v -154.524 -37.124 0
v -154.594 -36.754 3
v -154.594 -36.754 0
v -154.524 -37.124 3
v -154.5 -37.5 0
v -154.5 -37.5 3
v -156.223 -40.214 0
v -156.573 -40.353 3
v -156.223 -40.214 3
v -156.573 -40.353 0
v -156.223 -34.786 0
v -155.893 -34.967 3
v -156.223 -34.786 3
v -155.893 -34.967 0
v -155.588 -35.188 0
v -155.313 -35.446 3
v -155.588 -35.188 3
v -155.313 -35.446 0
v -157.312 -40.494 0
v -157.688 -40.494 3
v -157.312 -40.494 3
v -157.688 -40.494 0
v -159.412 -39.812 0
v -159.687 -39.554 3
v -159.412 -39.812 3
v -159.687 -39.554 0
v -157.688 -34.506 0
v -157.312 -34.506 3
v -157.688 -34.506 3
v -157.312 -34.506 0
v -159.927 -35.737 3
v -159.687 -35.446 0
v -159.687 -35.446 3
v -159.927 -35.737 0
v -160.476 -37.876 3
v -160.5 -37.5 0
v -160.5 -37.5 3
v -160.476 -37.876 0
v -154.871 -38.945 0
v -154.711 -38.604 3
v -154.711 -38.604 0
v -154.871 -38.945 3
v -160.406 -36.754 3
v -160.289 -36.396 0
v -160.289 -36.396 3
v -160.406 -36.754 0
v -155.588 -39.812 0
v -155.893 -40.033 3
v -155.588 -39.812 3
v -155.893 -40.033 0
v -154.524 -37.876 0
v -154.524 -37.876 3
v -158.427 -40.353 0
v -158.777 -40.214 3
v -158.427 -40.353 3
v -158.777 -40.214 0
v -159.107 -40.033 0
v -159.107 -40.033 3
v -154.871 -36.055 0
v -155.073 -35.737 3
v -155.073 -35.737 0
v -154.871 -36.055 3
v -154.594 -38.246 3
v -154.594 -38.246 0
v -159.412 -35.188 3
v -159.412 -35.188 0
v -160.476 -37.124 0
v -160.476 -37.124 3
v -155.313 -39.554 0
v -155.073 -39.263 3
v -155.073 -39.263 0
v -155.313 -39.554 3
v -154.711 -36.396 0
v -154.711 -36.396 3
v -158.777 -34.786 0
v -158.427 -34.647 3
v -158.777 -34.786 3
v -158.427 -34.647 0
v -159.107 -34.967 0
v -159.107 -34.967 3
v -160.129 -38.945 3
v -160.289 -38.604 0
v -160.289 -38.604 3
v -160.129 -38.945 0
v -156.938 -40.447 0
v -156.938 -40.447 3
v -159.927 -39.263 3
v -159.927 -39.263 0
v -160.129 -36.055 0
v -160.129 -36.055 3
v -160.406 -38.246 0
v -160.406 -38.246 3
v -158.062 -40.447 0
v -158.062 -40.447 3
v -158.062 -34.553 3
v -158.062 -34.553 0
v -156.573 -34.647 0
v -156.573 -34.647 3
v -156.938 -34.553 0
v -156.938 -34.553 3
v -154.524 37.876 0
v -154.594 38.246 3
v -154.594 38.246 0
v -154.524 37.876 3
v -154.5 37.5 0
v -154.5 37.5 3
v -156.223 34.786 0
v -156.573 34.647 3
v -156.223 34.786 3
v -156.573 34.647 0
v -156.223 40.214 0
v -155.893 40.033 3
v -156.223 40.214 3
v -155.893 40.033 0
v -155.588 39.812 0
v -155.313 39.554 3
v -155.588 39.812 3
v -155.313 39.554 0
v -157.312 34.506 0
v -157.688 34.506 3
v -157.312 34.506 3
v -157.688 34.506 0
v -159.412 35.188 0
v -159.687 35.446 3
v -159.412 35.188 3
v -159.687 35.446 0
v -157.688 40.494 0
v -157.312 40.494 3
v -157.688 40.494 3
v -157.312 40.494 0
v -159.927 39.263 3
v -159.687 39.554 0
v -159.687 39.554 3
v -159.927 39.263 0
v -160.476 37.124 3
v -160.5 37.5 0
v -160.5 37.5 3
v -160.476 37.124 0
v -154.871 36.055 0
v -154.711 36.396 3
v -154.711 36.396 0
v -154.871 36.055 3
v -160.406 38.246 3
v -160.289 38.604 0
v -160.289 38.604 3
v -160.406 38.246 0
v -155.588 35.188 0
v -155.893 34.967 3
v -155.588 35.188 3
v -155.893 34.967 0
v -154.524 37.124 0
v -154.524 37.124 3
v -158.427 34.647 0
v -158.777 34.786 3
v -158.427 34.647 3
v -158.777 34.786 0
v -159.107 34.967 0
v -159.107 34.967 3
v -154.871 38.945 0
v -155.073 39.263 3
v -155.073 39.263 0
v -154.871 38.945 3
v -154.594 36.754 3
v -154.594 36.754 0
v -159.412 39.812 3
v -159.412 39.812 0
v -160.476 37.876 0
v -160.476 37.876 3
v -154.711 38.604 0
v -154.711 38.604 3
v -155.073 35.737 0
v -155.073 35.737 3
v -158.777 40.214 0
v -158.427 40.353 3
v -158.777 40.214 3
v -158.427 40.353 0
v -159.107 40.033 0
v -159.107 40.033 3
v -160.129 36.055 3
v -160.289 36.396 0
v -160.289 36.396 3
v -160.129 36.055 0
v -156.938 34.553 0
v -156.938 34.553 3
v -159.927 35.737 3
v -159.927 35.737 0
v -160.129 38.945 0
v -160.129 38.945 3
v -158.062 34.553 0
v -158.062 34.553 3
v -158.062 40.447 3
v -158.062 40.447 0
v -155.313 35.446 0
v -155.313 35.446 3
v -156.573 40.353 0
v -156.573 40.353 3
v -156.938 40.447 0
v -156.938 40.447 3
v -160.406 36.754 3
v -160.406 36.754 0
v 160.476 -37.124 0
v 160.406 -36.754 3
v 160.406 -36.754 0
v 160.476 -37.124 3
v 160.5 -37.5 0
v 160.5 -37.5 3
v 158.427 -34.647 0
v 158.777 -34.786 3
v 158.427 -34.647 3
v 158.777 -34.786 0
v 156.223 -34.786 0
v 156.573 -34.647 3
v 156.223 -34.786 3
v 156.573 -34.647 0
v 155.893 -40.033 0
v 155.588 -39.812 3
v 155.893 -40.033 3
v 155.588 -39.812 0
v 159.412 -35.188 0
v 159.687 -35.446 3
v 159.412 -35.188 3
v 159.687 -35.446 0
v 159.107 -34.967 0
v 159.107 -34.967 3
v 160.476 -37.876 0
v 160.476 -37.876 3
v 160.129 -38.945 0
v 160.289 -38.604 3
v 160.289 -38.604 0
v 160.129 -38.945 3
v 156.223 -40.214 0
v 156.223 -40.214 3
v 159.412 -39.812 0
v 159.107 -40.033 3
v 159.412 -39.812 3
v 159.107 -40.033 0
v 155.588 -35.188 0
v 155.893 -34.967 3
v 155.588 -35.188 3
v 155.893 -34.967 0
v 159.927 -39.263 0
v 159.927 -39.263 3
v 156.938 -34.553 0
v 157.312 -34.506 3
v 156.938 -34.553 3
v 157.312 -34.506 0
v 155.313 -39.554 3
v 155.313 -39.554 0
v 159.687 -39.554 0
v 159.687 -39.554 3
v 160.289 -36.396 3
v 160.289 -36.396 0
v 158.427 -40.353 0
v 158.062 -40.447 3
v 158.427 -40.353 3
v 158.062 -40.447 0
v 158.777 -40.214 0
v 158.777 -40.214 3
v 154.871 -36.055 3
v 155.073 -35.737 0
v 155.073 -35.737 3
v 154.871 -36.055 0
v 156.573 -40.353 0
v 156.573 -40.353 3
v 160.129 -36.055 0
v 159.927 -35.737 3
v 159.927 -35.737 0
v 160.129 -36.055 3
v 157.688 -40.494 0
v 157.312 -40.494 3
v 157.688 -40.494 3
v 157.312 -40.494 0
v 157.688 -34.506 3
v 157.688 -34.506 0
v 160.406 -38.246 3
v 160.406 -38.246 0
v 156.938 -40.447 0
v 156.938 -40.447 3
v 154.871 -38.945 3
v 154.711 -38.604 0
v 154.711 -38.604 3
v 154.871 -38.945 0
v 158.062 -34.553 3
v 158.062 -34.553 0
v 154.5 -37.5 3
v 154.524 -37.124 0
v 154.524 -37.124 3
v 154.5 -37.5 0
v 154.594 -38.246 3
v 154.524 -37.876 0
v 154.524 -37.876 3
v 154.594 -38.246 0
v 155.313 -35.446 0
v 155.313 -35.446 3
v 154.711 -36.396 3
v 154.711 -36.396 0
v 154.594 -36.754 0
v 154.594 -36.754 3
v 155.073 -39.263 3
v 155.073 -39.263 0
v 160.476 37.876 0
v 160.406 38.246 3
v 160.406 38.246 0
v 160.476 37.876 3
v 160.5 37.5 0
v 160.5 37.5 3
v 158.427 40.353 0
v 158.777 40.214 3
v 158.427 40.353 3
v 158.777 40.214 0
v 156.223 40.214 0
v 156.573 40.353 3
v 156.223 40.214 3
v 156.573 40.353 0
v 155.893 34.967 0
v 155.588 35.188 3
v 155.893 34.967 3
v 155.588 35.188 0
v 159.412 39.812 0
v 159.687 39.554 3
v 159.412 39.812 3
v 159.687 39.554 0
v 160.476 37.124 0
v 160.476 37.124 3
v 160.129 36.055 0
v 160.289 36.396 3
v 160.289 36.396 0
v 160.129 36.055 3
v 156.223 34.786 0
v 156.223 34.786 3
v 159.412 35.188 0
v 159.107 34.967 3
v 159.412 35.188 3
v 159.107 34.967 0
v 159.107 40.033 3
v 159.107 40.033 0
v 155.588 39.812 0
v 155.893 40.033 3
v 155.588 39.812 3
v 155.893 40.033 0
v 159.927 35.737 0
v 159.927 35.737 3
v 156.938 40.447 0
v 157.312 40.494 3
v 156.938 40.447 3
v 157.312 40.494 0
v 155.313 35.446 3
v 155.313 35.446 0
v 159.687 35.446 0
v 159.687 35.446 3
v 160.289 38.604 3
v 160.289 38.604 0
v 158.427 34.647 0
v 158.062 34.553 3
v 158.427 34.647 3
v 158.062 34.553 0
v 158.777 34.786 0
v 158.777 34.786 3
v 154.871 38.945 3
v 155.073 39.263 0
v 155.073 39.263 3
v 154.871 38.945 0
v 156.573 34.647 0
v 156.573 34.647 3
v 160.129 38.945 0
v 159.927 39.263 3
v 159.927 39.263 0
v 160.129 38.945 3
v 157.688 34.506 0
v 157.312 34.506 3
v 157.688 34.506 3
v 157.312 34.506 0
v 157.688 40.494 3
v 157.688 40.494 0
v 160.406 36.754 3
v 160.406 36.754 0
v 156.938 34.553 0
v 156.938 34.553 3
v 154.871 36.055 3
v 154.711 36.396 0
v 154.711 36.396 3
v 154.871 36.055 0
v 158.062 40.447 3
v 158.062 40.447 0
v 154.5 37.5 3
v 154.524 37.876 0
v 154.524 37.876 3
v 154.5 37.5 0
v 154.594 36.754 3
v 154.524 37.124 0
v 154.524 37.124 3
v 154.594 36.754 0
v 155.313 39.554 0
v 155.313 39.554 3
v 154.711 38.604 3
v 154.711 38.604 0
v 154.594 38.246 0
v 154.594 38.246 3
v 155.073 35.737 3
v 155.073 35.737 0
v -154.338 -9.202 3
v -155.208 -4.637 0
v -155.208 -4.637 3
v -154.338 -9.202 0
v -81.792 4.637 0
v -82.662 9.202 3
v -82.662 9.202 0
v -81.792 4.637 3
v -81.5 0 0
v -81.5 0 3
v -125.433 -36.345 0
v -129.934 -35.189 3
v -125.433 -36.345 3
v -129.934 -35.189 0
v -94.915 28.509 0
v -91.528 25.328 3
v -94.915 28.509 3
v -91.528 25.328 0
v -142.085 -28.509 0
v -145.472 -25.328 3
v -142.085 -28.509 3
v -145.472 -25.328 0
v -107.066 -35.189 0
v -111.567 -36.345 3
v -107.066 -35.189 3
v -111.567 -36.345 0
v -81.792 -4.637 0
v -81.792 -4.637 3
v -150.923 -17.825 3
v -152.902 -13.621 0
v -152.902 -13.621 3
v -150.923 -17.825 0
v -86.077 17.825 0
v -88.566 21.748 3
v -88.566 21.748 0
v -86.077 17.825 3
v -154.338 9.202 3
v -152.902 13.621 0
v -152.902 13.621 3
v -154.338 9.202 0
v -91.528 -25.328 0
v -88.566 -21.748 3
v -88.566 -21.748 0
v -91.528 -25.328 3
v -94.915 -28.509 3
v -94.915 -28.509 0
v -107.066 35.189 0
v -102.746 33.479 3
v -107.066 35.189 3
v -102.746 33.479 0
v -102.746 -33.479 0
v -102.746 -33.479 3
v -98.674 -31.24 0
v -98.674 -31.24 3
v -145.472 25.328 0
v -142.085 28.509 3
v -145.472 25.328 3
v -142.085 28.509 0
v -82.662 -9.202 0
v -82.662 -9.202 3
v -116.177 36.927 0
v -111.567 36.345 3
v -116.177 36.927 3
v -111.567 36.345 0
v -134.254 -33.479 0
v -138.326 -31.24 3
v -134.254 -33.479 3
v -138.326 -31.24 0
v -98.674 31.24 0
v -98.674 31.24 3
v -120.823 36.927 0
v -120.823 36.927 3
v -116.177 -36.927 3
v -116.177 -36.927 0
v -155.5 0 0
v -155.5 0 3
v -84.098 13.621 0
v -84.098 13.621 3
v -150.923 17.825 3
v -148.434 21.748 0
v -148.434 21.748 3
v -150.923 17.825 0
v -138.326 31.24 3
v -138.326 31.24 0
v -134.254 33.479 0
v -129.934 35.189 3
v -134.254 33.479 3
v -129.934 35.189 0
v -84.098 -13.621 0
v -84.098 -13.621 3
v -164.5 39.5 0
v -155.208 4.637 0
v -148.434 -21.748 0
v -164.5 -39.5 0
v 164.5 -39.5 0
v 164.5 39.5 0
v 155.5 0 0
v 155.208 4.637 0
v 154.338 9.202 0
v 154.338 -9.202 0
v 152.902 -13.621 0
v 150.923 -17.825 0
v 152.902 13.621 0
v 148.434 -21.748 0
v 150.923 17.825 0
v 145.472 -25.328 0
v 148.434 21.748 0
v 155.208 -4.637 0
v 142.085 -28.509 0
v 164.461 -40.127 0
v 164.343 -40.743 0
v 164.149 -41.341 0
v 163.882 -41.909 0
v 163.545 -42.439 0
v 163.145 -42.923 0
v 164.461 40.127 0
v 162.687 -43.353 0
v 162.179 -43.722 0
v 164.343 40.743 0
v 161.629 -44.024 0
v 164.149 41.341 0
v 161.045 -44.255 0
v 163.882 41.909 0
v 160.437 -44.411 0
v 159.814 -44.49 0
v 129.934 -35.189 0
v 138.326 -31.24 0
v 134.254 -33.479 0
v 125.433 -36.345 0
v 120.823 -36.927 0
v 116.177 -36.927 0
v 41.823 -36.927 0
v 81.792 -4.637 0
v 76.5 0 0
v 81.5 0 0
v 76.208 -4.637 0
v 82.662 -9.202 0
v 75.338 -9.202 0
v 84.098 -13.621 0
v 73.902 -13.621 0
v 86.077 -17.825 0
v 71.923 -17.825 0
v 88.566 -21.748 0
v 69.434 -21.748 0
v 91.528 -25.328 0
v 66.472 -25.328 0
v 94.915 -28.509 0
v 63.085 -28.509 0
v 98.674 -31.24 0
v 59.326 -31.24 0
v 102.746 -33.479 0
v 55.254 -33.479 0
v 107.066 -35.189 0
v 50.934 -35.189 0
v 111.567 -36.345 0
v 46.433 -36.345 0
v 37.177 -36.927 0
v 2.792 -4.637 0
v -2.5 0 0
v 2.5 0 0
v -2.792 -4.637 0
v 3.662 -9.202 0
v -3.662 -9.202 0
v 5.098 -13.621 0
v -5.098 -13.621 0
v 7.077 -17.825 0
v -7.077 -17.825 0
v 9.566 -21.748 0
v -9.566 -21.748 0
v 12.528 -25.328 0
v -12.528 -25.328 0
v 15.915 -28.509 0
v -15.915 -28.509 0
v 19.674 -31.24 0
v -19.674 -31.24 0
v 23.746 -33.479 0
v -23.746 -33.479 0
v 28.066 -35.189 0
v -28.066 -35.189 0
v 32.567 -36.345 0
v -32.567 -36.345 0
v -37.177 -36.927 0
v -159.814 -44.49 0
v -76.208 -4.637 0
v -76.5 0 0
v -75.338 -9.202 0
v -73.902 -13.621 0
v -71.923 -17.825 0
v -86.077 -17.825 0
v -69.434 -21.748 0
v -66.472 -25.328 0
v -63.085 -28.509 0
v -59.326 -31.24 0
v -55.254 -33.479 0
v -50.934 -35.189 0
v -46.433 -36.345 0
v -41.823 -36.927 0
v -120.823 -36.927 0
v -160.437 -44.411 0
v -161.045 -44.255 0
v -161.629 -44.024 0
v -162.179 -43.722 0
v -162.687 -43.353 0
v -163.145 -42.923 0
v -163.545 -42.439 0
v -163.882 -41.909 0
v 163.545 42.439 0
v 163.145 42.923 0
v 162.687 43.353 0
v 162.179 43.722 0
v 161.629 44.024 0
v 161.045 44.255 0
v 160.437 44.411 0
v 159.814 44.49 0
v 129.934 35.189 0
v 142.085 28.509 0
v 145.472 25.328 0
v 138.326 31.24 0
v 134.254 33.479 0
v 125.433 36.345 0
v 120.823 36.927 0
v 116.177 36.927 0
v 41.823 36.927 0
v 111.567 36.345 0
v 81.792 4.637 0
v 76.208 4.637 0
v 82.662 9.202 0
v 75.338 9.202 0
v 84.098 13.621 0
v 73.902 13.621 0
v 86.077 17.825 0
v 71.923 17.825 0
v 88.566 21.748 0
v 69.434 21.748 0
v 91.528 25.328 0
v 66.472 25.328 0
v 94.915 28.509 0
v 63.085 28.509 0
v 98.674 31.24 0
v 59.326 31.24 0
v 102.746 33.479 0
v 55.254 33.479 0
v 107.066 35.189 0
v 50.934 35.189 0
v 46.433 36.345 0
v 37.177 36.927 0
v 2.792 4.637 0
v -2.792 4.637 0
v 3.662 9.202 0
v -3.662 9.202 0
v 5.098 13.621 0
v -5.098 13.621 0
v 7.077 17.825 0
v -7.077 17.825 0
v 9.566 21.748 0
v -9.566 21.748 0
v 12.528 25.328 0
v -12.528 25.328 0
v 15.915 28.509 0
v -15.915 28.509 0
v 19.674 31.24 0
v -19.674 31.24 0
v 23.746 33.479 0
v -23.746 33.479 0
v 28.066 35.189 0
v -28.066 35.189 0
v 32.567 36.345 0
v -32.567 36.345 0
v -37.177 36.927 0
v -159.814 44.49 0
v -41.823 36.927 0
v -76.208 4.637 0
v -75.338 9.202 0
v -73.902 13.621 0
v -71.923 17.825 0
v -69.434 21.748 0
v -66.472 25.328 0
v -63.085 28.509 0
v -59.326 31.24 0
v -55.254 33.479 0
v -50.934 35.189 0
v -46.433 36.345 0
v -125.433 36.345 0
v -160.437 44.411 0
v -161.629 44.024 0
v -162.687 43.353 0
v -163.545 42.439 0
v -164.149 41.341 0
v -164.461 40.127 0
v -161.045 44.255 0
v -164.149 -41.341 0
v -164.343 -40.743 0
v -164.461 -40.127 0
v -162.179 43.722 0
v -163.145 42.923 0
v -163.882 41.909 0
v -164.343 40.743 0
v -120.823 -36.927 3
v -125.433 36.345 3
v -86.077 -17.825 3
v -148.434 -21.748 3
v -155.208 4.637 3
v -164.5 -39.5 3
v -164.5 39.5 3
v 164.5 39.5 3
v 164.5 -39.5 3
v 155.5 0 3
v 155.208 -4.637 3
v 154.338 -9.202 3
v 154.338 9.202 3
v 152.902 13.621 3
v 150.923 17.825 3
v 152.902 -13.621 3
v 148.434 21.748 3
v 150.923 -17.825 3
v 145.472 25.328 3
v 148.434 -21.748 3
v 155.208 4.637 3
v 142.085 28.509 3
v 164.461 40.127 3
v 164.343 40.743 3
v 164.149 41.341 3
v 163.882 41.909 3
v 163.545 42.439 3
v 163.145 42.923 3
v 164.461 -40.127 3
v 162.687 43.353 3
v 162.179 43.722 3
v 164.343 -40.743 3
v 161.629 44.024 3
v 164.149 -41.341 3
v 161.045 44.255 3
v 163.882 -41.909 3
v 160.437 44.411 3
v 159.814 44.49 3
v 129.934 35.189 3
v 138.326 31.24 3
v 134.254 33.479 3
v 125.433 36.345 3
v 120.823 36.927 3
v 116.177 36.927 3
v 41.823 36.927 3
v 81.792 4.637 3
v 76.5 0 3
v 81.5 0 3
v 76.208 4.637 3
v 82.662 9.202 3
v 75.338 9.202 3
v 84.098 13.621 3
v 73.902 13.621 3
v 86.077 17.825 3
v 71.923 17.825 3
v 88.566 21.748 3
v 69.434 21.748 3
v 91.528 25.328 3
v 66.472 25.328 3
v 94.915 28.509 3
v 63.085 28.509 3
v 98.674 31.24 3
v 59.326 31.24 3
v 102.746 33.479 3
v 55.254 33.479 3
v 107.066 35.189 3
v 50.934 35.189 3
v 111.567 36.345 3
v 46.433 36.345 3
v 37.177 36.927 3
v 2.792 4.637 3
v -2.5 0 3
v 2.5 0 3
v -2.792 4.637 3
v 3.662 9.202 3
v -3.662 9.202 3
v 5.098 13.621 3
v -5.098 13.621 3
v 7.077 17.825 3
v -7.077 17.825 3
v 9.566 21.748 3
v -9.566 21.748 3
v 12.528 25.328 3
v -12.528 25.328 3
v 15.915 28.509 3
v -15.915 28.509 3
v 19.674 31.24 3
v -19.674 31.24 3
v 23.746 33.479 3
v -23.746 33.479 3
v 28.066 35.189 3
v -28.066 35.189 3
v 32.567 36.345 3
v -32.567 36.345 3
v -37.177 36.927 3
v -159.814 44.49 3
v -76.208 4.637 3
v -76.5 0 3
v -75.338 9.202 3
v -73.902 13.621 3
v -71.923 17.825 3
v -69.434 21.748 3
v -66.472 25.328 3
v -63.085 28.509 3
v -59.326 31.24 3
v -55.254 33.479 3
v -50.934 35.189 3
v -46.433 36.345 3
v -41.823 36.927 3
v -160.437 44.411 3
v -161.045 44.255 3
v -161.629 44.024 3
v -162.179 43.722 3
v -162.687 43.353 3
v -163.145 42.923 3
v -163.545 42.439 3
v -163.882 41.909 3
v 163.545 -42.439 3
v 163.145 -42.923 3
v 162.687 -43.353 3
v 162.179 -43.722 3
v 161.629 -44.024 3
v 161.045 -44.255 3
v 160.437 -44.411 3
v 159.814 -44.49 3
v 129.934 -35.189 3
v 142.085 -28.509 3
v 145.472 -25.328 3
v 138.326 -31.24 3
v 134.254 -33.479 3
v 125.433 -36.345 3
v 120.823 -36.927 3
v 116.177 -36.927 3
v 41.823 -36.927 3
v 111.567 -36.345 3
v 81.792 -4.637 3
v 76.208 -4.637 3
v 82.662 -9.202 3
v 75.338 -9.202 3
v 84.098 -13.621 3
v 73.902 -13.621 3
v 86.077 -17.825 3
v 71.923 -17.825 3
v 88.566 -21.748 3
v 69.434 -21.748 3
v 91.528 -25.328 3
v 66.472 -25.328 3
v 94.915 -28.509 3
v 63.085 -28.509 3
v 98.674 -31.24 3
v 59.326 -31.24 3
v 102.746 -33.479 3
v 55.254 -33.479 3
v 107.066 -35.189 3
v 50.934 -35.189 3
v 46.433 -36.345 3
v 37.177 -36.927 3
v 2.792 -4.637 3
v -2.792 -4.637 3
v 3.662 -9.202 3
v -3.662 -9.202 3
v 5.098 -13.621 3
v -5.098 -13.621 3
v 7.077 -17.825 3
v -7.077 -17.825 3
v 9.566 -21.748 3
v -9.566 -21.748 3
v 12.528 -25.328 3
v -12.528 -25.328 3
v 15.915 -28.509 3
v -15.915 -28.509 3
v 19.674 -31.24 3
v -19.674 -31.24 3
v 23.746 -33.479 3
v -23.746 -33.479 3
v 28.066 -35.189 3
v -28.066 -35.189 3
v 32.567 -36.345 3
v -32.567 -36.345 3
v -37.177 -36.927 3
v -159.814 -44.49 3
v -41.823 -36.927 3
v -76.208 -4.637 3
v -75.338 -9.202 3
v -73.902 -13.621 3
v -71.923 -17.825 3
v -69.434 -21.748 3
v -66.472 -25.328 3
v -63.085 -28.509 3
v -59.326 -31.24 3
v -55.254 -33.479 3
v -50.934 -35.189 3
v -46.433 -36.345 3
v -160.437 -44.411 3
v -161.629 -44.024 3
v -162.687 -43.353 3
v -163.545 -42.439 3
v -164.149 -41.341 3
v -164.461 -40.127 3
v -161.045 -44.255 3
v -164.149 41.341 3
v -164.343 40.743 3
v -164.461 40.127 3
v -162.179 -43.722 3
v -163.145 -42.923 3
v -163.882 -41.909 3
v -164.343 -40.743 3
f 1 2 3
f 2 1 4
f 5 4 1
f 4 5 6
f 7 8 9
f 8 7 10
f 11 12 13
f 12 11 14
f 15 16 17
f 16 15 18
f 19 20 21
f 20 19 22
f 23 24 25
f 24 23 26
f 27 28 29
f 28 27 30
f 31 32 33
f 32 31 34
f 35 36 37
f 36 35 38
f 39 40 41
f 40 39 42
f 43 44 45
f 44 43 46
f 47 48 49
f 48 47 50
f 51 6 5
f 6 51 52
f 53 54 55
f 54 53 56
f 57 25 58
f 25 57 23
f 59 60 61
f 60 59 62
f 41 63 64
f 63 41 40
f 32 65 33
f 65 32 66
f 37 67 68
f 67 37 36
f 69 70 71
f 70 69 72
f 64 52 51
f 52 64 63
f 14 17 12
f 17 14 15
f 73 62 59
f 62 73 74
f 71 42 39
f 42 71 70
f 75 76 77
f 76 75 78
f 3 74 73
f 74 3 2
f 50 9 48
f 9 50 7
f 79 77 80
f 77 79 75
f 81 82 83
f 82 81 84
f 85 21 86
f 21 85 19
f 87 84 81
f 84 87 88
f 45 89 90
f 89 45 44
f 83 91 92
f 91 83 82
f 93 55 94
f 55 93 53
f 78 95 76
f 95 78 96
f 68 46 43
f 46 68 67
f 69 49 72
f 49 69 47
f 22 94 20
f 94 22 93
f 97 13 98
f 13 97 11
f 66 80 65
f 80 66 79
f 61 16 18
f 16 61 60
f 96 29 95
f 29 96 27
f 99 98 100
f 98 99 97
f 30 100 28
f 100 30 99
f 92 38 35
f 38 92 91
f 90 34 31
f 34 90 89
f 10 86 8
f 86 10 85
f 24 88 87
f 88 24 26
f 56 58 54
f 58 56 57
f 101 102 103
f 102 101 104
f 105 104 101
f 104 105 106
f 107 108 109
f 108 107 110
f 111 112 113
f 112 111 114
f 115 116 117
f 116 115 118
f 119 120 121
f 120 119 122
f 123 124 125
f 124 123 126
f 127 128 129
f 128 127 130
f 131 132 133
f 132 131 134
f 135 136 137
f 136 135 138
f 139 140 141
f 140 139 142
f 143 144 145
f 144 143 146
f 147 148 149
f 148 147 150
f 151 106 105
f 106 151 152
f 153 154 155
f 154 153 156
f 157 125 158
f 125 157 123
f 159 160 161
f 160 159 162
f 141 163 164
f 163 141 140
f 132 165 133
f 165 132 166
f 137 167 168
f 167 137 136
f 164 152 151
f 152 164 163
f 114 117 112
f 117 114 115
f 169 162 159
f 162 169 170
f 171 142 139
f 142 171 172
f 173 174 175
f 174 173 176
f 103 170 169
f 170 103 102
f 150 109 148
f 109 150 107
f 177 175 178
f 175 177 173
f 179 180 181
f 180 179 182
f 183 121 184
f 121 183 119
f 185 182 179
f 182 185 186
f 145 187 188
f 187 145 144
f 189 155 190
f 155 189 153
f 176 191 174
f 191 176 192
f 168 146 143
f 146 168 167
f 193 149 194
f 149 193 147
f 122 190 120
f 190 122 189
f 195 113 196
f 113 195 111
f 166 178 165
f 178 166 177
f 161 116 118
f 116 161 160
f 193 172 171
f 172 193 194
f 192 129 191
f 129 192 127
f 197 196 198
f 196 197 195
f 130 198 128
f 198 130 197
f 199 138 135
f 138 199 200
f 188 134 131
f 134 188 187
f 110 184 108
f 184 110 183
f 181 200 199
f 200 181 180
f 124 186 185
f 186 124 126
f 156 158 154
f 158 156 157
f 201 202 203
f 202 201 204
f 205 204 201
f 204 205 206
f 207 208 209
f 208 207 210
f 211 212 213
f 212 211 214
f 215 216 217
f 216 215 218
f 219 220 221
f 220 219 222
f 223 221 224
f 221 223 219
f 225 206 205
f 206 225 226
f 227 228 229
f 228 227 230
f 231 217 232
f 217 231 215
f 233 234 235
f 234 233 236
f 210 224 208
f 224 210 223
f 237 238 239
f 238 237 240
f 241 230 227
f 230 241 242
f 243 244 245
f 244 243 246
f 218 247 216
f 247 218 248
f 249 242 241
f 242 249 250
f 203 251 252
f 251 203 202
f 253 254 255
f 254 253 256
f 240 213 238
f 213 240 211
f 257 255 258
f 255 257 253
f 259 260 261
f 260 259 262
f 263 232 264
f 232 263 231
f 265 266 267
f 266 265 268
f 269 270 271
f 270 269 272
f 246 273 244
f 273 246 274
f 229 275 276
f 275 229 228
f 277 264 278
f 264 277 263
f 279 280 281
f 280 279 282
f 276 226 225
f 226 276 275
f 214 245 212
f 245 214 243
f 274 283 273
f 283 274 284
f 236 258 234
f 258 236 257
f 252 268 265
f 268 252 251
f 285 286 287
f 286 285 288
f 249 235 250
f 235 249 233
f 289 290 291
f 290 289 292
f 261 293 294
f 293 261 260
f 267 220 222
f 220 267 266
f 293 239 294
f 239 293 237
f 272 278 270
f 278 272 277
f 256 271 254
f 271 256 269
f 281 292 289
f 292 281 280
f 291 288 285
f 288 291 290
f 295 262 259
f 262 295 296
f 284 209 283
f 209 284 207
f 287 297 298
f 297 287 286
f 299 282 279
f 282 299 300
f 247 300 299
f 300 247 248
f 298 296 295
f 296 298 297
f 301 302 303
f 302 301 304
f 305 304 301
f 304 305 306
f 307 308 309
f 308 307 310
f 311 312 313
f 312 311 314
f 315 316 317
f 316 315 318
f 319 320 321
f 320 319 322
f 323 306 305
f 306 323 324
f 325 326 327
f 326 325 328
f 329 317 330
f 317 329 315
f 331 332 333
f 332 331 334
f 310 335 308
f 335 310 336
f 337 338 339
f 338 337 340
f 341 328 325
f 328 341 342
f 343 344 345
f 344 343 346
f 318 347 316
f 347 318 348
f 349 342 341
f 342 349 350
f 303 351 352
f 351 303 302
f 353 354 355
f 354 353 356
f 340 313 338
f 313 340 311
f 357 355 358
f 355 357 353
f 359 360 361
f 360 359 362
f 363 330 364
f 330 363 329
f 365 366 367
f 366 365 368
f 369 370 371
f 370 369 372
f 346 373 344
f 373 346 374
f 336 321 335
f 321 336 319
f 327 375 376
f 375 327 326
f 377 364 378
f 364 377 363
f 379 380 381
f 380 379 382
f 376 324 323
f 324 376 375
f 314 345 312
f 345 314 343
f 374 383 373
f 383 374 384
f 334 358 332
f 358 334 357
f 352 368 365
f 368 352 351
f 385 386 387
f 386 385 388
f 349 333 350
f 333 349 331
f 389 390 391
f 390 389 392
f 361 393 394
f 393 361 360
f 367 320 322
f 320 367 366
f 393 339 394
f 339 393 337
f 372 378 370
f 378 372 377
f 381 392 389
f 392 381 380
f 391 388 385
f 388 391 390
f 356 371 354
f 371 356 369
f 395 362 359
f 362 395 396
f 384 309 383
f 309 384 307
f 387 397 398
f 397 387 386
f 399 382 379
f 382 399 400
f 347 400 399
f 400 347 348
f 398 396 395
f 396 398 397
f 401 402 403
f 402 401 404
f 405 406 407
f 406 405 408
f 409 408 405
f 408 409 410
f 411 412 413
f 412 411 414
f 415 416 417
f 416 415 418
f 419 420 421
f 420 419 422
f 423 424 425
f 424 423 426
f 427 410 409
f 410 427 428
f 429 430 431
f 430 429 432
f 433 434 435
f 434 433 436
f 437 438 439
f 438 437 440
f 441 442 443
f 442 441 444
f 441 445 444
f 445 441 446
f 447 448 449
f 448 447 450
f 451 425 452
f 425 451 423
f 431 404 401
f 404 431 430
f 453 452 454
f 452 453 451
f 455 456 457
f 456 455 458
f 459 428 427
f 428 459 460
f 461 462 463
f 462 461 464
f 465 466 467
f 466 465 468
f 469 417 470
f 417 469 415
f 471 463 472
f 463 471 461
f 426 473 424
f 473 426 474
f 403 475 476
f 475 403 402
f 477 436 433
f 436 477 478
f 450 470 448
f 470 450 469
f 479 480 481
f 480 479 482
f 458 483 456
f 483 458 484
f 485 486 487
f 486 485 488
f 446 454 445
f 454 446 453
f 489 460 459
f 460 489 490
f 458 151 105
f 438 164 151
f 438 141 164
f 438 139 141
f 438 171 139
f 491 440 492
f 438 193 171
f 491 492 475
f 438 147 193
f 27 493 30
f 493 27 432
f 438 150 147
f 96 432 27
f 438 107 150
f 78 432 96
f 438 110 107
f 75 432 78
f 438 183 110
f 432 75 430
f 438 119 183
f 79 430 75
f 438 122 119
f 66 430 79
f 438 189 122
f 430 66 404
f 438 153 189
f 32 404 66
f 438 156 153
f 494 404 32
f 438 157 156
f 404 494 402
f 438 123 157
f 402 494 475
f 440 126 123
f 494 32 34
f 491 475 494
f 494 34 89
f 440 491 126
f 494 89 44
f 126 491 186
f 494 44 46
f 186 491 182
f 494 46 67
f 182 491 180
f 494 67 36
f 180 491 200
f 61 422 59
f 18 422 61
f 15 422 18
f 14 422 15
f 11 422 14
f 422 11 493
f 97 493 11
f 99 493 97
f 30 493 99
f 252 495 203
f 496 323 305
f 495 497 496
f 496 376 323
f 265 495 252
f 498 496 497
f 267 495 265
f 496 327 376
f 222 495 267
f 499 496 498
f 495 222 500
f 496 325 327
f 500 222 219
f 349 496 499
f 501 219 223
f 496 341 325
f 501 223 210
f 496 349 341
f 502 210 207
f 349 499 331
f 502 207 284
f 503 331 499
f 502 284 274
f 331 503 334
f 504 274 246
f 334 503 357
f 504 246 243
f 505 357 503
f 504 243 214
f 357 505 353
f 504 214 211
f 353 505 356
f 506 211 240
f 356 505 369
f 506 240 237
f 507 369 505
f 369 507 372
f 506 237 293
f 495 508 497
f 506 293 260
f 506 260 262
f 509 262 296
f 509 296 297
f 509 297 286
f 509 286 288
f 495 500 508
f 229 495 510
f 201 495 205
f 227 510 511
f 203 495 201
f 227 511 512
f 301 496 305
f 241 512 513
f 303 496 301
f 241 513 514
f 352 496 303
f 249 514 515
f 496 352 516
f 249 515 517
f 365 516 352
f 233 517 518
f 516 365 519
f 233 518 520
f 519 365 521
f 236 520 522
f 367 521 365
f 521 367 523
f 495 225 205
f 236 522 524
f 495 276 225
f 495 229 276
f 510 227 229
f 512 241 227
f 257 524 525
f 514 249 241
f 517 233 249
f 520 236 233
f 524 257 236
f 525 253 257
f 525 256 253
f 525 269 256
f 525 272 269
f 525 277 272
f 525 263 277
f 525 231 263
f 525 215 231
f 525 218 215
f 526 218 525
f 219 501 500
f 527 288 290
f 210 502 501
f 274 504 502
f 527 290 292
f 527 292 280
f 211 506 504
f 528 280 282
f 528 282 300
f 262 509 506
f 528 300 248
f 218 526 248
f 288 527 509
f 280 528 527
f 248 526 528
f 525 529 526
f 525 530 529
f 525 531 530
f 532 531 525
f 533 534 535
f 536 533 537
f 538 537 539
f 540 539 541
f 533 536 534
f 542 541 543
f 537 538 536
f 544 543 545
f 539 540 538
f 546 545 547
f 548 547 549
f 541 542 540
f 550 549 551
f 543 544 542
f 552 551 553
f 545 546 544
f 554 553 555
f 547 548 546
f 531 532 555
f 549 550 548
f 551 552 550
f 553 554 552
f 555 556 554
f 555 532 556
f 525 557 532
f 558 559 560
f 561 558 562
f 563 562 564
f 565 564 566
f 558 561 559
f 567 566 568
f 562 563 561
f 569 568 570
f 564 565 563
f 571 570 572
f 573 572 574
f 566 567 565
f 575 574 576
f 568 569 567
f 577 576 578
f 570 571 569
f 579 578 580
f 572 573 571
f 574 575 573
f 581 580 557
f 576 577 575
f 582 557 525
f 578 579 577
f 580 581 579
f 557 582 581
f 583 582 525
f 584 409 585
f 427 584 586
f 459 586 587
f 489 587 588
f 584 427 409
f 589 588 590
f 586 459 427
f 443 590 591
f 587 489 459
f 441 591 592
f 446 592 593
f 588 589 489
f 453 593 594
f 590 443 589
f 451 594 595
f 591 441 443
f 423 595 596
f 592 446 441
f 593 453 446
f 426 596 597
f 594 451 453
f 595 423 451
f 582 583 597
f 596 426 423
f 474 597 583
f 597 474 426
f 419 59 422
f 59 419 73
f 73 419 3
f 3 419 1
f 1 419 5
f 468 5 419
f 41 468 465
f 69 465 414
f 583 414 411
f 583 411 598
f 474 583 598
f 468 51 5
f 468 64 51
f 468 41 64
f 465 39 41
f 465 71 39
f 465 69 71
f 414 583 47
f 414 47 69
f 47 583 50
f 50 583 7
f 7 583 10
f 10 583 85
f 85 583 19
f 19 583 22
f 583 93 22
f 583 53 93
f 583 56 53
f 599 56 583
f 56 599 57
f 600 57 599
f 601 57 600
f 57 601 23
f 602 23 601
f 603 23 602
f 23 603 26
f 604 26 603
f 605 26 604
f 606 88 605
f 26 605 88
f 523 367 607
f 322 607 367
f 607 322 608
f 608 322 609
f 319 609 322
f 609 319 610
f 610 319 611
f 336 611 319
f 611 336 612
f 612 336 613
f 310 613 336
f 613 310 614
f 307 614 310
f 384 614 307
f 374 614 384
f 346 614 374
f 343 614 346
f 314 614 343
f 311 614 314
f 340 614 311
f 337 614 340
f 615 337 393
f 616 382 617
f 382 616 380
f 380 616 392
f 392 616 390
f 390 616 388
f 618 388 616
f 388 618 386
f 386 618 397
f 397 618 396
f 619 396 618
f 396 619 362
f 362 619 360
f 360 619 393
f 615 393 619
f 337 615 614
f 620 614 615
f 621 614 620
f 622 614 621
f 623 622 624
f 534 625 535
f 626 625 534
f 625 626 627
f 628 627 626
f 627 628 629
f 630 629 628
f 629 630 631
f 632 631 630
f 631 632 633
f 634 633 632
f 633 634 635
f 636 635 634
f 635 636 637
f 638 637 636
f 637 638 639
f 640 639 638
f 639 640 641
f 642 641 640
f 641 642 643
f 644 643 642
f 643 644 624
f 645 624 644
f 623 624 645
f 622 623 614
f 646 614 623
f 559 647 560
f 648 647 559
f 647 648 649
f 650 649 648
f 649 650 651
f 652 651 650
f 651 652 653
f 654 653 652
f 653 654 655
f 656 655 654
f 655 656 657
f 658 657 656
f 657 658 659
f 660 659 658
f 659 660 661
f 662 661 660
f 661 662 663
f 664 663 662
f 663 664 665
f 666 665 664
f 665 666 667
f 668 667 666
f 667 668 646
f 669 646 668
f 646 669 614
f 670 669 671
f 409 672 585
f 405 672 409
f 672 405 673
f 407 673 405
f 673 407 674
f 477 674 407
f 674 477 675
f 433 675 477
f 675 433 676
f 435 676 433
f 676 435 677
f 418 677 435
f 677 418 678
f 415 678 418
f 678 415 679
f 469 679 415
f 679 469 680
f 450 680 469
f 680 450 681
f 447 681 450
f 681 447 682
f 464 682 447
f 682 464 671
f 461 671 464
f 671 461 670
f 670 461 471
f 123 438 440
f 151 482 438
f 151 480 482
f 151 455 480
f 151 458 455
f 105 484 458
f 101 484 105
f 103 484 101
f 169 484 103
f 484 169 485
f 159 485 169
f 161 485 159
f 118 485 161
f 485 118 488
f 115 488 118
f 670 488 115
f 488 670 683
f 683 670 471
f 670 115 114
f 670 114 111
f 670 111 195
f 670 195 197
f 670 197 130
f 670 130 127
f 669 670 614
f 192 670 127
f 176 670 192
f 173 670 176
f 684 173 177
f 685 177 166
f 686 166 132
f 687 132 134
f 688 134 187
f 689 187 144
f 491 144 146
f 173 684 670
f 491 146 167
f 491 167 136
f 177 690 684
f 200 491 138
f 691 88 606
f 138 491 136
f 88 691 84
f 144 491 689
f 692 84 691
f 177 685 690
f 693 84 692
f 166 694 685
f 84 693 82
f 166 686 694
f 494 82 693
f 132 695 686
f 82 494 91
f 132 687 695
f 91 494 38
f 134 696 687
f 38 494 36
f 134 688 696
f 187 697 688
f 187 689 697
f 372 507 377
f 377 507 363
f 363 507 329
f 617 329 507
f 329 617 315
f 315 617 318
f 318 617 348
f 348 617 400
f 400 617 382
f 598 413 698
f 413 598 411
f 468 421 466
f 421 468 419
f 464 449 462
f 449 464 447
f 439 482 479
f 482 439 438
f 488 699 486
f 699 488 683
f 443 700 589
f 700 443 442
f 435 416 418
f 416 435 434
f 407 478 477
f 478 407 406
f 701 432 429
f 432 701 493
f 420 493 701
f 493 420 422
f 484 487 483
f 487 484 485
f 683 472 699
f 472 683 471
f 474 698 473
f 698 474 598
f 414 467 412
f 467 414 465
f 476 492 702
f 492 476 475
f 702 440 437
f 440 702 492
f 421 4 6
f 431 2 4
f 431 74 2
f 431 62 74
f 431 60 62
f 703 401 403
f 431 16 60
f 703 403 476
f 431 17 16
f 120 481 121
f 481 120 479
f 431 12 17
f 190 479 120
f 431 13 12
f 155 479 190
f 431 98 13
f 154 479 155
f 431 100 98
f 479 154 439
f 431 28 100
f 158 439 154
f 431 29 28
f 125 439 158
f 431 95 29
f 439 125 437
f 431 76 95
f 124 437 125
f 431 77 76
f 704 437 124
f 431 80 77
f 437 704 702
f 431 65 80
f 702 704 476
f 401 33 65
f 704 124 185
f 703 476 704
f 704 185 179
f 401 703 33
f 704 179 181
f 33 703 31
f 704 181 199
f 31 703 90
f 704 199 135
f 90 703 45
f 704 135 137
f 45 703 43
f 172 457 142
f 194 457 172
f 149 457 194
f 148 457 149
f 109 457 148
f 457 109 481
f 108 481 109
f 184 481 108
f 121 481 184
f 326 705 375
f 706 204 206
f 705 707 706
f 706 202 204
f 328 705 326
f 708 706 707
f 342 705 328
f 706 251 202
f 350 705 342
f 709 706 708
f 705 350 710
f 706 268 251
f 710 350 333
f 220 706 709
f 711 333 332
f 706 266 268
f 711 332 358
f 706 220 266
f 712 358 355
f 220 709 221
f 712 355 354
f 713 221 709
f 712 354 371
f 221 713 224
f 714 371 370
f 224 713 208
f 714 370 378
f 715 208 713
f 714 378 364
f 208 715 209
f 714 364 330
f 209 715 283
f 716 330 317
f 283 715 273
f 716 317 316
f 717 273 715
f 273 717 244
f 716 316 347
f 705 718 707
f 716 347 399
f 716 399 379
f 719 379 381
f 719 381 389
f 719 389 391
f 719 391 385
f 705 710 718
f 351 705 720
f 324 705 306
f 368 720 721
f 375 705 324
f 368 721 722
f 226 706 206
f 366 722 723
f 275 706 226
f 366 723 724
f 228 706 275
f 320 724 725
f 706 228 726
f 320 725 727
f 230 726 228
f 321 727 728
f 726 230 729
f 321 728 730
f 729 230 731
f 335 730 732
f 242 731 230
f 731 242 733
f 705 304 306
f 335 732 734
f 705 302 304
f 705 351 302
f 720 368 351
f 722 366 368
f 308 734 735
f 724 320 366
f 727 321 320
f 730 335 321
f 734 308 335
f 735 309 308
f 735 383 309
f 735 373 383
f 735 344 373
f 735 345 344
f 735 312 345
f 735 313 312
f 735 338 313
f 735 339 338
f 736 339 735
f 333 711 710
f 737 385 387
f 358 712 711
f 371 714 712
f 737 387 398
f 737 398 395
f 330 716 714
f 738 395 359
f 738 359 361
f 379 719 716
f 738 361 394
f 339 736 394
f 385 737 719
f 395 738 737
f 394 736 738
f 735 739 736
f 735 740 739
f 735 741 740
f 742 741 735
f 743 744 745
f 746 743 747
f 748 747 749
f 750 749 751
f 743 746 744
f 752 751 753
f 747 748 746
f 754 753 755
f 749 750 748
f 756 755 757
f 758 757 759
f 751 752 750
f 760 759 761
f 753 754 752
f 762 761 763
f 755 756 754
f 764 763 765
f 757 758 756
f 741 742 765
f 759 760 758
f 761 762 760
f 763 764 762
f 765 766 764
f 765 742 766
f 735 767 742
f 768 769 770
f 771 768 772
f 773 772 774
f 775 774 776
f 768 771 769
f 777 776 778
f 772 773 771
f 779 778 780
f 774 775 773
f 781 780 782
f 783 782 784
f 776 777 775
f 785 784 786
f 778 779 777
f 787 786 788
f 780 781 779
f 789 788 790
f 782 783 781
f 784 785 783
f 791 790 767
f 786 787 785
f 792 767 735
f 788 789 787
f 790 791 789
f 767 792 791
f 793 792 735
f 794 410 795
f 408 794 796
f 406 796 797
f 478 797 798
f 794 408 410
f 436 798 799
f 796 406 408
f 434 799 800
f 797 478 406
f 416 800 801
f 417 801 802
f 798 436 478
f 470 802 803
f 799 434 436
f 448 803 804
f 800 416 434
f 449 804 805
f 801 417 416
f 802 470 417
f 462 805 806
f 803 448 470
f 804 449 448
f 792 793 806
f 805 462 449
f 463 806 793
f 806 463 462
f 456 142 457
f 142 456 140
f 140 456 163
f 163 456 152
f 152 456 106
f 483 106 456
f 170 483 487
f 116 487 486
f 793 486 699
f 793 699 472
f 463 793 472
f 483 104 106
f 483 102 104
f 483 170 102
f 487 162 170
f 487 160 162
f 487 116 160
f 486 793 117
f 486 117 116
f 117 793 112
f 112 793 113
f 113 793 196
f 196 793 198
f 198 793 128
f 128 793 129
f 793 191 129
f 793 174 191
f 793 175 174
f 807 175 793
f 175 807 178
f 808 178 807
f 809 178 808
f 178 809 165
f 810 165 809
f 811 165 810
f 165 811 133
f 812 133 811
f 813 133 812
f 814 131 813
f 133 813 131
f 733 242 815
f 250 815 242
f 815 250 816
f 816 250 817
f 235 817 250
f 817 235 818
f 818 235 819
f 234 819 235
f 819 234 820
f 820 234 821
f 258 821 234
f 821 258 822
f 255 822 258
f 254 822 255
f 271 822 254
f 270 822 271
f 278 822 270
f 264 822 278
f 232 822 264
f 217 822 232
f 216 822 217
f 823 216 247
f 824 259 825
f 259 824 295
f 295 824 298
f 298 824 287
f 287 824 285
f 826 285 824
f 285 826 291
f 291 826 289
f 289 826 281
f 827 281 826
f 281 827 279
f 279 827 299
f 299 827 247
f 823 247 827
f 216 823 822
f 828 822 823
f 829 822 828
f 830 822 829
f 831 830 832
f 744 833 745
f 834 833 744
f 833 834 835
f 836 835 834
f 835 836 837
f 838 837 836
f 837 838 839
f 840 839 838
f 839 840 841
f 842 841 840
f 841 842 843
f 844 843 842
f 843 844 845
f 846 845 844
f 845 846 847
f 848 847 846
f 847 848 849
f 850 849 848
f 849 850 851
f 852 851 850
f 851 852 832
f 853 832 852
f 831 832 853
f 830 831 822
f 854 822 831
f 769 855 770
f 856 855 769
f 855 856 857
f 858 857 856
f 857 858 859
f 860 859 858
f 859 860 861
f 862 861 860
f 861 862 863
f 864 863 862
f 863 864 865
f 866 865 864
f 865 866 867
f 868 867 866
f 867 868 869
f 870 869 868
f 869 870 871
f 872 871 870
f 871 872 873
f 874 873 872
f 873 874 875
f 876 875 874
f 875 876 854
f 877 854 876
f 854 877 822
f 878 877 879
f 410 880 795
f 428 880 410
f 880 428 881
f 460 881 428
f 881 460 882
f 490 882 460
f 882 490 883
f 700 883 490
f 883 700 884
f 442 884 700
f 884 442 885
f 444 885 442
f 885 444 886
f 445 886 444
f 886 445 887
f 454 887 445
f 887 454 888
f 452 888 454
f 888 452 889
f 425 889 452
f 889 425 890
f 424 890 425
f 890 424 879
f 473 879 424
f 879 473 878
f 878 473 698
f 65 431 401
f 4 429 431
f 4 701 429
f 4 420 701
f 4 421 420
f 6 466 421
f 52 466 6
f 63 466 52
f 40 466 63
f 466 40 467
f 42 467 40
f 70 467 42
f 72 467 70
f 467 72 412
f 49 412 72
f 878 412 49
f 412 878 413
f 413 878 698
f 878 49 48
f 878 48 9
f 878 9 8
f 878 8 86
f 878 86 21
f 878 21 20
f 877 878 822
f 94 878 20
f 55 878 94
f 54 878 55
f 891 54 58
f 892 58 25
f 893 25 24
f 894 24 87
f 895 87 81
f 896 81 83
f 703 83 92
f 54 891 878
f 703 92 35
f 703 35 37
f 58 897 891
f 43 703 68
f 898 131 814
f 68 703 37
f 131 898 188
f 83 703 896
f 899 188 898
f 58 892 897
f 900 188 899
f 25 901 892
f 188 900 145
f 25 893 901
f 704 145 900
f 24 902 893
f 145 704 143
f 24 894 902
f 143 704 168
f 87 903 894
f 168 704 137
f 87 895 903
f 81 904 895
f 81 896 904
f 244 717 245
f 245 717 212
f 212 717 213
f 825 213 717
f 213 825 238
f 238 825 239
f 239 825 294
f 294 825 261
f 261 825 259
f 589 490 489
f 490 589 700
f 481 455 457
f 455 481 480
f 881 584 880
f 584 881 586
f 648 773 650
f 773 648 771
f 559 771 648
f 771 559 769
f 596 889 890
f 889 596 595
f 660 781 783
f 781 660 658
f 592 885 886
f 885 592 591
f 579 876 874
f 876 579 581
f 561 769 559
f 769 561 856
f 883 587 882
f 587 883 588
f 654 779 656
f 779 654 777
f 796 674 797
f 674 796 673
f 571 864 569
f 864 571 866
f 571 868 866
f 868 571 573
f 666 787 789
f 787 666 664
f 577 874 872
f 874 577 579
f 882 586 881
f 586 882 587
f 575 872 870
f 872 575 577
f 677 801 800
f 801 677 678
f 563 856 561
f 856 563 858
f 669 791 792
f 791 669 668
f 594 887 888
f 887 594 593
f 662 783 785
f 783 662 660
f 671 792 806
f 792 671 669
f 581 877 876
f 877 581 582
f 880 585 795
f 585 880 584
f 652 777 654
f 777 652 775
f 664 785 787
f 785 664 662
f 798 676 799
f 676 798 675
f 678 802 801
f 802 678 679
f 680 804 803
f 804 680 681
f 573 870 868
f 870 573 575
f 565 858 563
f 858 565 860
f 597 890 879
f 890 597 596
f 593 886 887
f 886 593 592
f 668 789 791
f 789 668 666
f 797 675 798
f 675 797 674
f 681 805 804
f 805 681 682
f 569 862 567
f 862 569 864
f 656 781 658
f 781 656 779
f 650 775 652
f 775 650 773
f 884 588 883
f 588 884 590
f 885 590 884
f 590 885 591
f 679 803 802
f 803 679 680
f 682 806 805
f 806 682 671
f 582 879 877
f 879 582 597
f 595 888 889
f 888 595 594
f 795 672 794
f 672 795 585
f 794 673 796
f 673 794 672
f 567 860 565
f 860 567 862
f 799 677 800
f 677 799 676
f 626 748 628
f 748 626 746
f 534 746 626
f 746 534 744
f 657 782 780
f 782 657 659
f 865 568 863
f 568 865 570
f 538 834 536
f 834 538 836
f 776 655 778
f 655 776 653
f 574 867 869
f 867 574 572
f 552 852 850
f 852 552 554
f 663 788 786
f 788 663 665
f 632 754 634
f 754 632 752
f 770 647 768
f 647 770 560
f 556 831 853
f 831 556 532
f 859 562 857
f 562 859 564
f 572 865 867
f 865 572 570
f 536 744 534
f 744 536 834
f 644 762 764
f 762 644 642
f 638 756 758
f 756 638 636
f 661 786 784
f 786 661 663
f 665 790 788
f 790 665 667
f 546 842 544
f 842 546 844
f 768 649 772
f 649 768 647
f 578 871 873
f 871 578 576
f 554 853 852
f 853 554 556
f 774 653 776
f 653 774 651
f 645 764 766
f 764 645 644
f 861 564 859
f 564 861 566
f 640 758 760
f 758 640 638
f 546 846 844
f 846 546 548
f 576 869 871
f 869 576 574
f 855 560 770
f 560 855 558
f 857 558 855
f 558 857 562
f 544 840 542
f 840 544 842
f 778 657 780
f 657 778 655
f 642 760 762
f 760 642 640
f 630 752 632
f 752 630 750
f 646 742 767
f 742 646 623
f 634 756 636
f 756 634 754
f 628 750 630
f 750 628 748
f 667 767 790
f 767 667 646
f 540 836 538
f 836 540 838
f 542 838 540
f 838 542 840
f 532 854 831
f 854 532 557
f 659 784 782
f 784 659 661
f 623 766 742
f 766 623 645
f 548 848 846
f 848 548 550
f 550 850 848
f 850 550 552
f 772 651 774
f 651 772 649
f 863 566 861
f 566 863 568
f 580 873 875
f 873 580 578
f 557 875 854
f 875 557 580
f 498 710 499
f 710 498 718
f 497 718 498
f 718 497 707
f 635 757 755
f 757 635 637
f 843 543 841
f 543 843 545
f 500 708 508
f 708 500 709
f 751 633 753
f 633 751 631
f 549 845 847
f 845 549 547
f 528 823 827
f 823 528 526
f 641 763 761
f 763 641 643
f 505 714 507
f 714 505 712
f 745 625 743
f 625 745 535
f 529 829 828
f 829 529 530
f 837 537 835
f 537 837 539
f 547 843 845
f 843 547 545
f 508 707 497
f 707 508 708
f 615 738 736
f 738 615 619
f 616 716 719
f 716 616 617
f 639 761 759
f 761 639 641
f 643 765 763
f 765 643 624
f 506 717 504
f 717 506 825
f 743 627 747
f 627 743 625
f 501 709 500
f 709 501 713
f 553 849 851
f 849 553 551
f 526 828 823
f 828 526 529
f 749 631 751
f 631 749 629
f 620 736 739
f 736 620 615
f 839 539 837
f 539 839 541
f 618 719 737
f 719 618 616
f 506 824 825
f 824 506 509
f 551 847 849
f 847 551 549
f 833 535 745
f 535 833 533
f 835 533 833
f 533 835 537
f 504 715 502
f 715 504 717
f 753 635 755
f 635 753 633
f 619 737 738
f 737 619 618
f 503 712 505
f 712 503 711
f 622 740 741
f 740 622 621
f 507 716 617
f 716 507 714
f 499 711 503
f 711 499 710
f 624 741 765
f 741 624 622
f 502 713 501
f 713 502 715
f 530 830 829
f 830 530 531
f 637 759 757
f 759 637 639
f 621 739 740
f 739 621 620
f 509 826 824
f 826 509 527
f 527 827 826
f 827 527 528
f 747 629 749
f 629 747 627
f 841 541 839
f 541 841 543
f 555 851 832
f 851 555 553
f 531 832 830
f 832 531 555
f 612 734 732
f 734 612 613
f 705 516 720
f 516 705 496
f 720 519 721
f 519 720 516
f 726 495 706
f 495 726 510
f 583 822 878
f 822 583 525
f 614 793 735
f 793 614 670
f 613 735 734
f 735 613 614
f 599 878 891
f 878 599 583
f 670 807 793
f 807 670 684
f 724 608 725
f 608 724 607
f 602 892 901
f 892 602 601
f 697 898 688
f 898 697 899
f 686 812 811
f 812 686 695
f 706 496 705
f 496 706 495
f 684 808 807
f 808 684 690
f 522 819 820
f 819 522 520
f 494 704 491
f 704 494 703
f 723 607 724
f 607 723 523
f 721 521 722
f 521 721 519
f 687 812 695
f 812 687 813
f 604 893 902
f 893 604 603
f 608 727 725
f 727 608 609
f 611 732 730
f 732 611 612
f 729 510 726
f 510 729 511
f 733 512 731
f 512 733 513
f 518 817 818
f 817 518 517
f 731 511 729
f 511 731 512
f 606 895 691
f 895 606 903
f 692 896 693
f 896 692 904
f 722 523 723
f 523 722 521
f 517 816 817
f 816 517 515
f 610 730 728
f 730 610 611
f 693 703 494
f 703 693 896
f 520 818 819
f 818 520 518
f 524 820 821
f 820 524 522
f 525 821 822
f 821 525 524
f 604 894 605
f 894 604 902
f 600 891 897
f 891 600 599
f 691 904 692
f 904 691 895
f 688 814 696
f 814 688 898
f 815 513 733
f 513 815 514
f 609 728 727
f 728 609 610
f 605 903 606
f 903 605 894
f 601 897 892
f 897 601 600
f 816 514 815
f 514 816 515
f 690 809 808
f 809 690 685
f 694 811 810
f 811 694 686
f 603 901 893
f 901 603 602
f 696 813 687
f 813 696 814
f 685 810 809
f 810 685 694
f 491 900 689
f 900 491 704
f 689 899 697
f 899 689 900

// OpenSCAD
$fn = 50;


difference() {
	union() {
		hull() {
			translate(v = [-159.5000000000, 39.5000000000, 0]) {
				cylinder(h = 3, r = 5);
			}
			translate(v = [159.5000000000, 39.5000000000, 0]) {
				cylinder(h = 3, r = 5);
			}
			translate(v = [-159.5000000000, -39.5000000000, 0]) {
				cylinder(h = 3, r = 5);
			}
			translate(v = [159.5000000000, -39.5000000000, 0]) {
				cylinder(h = 3, r = 5);
			}
		}
	}
	union() {
		#translate(v = [-157.5000000000, -37.5000000000, -100.0000000000]) {
			cylinder(h = 200, r = 3.0000000000);
		}
		#translate(v = [-157.5000000000, 37.5000000000, -100.0000000000]) {
			cylinder(h = 200, r = 3.0000000000);
		}
		#translate(v = [157.5000000000, -37.5000000000, -100.0000000000]) {
			cylinder(h = 200, r = 3.0000000000);
		}
		#translate(v = [157.5000000000, 37.5000000000, -100.0000000000]) {
			cylinder(h = 200, r = 3.0000000000);
		}
		#translate(v = [-118.5000000000, 0, 0]) {
			cylinder(h = 3, r = 37.0000000000);
		}
		#translate(v = [-39.5000000000, 0, 0]) {
			cylinder(h = 3, r = 37.0000000000);
		}
		#translate(v = [39.5000000000, 0, 0]) {
			cylinder(h = 3, r = 37.0000000000);
		}
		#translate(v = [118.5000000000, 0, 0]) {
			cylinder(h = 3, r = 37.0000000000);
		}
	}
}
